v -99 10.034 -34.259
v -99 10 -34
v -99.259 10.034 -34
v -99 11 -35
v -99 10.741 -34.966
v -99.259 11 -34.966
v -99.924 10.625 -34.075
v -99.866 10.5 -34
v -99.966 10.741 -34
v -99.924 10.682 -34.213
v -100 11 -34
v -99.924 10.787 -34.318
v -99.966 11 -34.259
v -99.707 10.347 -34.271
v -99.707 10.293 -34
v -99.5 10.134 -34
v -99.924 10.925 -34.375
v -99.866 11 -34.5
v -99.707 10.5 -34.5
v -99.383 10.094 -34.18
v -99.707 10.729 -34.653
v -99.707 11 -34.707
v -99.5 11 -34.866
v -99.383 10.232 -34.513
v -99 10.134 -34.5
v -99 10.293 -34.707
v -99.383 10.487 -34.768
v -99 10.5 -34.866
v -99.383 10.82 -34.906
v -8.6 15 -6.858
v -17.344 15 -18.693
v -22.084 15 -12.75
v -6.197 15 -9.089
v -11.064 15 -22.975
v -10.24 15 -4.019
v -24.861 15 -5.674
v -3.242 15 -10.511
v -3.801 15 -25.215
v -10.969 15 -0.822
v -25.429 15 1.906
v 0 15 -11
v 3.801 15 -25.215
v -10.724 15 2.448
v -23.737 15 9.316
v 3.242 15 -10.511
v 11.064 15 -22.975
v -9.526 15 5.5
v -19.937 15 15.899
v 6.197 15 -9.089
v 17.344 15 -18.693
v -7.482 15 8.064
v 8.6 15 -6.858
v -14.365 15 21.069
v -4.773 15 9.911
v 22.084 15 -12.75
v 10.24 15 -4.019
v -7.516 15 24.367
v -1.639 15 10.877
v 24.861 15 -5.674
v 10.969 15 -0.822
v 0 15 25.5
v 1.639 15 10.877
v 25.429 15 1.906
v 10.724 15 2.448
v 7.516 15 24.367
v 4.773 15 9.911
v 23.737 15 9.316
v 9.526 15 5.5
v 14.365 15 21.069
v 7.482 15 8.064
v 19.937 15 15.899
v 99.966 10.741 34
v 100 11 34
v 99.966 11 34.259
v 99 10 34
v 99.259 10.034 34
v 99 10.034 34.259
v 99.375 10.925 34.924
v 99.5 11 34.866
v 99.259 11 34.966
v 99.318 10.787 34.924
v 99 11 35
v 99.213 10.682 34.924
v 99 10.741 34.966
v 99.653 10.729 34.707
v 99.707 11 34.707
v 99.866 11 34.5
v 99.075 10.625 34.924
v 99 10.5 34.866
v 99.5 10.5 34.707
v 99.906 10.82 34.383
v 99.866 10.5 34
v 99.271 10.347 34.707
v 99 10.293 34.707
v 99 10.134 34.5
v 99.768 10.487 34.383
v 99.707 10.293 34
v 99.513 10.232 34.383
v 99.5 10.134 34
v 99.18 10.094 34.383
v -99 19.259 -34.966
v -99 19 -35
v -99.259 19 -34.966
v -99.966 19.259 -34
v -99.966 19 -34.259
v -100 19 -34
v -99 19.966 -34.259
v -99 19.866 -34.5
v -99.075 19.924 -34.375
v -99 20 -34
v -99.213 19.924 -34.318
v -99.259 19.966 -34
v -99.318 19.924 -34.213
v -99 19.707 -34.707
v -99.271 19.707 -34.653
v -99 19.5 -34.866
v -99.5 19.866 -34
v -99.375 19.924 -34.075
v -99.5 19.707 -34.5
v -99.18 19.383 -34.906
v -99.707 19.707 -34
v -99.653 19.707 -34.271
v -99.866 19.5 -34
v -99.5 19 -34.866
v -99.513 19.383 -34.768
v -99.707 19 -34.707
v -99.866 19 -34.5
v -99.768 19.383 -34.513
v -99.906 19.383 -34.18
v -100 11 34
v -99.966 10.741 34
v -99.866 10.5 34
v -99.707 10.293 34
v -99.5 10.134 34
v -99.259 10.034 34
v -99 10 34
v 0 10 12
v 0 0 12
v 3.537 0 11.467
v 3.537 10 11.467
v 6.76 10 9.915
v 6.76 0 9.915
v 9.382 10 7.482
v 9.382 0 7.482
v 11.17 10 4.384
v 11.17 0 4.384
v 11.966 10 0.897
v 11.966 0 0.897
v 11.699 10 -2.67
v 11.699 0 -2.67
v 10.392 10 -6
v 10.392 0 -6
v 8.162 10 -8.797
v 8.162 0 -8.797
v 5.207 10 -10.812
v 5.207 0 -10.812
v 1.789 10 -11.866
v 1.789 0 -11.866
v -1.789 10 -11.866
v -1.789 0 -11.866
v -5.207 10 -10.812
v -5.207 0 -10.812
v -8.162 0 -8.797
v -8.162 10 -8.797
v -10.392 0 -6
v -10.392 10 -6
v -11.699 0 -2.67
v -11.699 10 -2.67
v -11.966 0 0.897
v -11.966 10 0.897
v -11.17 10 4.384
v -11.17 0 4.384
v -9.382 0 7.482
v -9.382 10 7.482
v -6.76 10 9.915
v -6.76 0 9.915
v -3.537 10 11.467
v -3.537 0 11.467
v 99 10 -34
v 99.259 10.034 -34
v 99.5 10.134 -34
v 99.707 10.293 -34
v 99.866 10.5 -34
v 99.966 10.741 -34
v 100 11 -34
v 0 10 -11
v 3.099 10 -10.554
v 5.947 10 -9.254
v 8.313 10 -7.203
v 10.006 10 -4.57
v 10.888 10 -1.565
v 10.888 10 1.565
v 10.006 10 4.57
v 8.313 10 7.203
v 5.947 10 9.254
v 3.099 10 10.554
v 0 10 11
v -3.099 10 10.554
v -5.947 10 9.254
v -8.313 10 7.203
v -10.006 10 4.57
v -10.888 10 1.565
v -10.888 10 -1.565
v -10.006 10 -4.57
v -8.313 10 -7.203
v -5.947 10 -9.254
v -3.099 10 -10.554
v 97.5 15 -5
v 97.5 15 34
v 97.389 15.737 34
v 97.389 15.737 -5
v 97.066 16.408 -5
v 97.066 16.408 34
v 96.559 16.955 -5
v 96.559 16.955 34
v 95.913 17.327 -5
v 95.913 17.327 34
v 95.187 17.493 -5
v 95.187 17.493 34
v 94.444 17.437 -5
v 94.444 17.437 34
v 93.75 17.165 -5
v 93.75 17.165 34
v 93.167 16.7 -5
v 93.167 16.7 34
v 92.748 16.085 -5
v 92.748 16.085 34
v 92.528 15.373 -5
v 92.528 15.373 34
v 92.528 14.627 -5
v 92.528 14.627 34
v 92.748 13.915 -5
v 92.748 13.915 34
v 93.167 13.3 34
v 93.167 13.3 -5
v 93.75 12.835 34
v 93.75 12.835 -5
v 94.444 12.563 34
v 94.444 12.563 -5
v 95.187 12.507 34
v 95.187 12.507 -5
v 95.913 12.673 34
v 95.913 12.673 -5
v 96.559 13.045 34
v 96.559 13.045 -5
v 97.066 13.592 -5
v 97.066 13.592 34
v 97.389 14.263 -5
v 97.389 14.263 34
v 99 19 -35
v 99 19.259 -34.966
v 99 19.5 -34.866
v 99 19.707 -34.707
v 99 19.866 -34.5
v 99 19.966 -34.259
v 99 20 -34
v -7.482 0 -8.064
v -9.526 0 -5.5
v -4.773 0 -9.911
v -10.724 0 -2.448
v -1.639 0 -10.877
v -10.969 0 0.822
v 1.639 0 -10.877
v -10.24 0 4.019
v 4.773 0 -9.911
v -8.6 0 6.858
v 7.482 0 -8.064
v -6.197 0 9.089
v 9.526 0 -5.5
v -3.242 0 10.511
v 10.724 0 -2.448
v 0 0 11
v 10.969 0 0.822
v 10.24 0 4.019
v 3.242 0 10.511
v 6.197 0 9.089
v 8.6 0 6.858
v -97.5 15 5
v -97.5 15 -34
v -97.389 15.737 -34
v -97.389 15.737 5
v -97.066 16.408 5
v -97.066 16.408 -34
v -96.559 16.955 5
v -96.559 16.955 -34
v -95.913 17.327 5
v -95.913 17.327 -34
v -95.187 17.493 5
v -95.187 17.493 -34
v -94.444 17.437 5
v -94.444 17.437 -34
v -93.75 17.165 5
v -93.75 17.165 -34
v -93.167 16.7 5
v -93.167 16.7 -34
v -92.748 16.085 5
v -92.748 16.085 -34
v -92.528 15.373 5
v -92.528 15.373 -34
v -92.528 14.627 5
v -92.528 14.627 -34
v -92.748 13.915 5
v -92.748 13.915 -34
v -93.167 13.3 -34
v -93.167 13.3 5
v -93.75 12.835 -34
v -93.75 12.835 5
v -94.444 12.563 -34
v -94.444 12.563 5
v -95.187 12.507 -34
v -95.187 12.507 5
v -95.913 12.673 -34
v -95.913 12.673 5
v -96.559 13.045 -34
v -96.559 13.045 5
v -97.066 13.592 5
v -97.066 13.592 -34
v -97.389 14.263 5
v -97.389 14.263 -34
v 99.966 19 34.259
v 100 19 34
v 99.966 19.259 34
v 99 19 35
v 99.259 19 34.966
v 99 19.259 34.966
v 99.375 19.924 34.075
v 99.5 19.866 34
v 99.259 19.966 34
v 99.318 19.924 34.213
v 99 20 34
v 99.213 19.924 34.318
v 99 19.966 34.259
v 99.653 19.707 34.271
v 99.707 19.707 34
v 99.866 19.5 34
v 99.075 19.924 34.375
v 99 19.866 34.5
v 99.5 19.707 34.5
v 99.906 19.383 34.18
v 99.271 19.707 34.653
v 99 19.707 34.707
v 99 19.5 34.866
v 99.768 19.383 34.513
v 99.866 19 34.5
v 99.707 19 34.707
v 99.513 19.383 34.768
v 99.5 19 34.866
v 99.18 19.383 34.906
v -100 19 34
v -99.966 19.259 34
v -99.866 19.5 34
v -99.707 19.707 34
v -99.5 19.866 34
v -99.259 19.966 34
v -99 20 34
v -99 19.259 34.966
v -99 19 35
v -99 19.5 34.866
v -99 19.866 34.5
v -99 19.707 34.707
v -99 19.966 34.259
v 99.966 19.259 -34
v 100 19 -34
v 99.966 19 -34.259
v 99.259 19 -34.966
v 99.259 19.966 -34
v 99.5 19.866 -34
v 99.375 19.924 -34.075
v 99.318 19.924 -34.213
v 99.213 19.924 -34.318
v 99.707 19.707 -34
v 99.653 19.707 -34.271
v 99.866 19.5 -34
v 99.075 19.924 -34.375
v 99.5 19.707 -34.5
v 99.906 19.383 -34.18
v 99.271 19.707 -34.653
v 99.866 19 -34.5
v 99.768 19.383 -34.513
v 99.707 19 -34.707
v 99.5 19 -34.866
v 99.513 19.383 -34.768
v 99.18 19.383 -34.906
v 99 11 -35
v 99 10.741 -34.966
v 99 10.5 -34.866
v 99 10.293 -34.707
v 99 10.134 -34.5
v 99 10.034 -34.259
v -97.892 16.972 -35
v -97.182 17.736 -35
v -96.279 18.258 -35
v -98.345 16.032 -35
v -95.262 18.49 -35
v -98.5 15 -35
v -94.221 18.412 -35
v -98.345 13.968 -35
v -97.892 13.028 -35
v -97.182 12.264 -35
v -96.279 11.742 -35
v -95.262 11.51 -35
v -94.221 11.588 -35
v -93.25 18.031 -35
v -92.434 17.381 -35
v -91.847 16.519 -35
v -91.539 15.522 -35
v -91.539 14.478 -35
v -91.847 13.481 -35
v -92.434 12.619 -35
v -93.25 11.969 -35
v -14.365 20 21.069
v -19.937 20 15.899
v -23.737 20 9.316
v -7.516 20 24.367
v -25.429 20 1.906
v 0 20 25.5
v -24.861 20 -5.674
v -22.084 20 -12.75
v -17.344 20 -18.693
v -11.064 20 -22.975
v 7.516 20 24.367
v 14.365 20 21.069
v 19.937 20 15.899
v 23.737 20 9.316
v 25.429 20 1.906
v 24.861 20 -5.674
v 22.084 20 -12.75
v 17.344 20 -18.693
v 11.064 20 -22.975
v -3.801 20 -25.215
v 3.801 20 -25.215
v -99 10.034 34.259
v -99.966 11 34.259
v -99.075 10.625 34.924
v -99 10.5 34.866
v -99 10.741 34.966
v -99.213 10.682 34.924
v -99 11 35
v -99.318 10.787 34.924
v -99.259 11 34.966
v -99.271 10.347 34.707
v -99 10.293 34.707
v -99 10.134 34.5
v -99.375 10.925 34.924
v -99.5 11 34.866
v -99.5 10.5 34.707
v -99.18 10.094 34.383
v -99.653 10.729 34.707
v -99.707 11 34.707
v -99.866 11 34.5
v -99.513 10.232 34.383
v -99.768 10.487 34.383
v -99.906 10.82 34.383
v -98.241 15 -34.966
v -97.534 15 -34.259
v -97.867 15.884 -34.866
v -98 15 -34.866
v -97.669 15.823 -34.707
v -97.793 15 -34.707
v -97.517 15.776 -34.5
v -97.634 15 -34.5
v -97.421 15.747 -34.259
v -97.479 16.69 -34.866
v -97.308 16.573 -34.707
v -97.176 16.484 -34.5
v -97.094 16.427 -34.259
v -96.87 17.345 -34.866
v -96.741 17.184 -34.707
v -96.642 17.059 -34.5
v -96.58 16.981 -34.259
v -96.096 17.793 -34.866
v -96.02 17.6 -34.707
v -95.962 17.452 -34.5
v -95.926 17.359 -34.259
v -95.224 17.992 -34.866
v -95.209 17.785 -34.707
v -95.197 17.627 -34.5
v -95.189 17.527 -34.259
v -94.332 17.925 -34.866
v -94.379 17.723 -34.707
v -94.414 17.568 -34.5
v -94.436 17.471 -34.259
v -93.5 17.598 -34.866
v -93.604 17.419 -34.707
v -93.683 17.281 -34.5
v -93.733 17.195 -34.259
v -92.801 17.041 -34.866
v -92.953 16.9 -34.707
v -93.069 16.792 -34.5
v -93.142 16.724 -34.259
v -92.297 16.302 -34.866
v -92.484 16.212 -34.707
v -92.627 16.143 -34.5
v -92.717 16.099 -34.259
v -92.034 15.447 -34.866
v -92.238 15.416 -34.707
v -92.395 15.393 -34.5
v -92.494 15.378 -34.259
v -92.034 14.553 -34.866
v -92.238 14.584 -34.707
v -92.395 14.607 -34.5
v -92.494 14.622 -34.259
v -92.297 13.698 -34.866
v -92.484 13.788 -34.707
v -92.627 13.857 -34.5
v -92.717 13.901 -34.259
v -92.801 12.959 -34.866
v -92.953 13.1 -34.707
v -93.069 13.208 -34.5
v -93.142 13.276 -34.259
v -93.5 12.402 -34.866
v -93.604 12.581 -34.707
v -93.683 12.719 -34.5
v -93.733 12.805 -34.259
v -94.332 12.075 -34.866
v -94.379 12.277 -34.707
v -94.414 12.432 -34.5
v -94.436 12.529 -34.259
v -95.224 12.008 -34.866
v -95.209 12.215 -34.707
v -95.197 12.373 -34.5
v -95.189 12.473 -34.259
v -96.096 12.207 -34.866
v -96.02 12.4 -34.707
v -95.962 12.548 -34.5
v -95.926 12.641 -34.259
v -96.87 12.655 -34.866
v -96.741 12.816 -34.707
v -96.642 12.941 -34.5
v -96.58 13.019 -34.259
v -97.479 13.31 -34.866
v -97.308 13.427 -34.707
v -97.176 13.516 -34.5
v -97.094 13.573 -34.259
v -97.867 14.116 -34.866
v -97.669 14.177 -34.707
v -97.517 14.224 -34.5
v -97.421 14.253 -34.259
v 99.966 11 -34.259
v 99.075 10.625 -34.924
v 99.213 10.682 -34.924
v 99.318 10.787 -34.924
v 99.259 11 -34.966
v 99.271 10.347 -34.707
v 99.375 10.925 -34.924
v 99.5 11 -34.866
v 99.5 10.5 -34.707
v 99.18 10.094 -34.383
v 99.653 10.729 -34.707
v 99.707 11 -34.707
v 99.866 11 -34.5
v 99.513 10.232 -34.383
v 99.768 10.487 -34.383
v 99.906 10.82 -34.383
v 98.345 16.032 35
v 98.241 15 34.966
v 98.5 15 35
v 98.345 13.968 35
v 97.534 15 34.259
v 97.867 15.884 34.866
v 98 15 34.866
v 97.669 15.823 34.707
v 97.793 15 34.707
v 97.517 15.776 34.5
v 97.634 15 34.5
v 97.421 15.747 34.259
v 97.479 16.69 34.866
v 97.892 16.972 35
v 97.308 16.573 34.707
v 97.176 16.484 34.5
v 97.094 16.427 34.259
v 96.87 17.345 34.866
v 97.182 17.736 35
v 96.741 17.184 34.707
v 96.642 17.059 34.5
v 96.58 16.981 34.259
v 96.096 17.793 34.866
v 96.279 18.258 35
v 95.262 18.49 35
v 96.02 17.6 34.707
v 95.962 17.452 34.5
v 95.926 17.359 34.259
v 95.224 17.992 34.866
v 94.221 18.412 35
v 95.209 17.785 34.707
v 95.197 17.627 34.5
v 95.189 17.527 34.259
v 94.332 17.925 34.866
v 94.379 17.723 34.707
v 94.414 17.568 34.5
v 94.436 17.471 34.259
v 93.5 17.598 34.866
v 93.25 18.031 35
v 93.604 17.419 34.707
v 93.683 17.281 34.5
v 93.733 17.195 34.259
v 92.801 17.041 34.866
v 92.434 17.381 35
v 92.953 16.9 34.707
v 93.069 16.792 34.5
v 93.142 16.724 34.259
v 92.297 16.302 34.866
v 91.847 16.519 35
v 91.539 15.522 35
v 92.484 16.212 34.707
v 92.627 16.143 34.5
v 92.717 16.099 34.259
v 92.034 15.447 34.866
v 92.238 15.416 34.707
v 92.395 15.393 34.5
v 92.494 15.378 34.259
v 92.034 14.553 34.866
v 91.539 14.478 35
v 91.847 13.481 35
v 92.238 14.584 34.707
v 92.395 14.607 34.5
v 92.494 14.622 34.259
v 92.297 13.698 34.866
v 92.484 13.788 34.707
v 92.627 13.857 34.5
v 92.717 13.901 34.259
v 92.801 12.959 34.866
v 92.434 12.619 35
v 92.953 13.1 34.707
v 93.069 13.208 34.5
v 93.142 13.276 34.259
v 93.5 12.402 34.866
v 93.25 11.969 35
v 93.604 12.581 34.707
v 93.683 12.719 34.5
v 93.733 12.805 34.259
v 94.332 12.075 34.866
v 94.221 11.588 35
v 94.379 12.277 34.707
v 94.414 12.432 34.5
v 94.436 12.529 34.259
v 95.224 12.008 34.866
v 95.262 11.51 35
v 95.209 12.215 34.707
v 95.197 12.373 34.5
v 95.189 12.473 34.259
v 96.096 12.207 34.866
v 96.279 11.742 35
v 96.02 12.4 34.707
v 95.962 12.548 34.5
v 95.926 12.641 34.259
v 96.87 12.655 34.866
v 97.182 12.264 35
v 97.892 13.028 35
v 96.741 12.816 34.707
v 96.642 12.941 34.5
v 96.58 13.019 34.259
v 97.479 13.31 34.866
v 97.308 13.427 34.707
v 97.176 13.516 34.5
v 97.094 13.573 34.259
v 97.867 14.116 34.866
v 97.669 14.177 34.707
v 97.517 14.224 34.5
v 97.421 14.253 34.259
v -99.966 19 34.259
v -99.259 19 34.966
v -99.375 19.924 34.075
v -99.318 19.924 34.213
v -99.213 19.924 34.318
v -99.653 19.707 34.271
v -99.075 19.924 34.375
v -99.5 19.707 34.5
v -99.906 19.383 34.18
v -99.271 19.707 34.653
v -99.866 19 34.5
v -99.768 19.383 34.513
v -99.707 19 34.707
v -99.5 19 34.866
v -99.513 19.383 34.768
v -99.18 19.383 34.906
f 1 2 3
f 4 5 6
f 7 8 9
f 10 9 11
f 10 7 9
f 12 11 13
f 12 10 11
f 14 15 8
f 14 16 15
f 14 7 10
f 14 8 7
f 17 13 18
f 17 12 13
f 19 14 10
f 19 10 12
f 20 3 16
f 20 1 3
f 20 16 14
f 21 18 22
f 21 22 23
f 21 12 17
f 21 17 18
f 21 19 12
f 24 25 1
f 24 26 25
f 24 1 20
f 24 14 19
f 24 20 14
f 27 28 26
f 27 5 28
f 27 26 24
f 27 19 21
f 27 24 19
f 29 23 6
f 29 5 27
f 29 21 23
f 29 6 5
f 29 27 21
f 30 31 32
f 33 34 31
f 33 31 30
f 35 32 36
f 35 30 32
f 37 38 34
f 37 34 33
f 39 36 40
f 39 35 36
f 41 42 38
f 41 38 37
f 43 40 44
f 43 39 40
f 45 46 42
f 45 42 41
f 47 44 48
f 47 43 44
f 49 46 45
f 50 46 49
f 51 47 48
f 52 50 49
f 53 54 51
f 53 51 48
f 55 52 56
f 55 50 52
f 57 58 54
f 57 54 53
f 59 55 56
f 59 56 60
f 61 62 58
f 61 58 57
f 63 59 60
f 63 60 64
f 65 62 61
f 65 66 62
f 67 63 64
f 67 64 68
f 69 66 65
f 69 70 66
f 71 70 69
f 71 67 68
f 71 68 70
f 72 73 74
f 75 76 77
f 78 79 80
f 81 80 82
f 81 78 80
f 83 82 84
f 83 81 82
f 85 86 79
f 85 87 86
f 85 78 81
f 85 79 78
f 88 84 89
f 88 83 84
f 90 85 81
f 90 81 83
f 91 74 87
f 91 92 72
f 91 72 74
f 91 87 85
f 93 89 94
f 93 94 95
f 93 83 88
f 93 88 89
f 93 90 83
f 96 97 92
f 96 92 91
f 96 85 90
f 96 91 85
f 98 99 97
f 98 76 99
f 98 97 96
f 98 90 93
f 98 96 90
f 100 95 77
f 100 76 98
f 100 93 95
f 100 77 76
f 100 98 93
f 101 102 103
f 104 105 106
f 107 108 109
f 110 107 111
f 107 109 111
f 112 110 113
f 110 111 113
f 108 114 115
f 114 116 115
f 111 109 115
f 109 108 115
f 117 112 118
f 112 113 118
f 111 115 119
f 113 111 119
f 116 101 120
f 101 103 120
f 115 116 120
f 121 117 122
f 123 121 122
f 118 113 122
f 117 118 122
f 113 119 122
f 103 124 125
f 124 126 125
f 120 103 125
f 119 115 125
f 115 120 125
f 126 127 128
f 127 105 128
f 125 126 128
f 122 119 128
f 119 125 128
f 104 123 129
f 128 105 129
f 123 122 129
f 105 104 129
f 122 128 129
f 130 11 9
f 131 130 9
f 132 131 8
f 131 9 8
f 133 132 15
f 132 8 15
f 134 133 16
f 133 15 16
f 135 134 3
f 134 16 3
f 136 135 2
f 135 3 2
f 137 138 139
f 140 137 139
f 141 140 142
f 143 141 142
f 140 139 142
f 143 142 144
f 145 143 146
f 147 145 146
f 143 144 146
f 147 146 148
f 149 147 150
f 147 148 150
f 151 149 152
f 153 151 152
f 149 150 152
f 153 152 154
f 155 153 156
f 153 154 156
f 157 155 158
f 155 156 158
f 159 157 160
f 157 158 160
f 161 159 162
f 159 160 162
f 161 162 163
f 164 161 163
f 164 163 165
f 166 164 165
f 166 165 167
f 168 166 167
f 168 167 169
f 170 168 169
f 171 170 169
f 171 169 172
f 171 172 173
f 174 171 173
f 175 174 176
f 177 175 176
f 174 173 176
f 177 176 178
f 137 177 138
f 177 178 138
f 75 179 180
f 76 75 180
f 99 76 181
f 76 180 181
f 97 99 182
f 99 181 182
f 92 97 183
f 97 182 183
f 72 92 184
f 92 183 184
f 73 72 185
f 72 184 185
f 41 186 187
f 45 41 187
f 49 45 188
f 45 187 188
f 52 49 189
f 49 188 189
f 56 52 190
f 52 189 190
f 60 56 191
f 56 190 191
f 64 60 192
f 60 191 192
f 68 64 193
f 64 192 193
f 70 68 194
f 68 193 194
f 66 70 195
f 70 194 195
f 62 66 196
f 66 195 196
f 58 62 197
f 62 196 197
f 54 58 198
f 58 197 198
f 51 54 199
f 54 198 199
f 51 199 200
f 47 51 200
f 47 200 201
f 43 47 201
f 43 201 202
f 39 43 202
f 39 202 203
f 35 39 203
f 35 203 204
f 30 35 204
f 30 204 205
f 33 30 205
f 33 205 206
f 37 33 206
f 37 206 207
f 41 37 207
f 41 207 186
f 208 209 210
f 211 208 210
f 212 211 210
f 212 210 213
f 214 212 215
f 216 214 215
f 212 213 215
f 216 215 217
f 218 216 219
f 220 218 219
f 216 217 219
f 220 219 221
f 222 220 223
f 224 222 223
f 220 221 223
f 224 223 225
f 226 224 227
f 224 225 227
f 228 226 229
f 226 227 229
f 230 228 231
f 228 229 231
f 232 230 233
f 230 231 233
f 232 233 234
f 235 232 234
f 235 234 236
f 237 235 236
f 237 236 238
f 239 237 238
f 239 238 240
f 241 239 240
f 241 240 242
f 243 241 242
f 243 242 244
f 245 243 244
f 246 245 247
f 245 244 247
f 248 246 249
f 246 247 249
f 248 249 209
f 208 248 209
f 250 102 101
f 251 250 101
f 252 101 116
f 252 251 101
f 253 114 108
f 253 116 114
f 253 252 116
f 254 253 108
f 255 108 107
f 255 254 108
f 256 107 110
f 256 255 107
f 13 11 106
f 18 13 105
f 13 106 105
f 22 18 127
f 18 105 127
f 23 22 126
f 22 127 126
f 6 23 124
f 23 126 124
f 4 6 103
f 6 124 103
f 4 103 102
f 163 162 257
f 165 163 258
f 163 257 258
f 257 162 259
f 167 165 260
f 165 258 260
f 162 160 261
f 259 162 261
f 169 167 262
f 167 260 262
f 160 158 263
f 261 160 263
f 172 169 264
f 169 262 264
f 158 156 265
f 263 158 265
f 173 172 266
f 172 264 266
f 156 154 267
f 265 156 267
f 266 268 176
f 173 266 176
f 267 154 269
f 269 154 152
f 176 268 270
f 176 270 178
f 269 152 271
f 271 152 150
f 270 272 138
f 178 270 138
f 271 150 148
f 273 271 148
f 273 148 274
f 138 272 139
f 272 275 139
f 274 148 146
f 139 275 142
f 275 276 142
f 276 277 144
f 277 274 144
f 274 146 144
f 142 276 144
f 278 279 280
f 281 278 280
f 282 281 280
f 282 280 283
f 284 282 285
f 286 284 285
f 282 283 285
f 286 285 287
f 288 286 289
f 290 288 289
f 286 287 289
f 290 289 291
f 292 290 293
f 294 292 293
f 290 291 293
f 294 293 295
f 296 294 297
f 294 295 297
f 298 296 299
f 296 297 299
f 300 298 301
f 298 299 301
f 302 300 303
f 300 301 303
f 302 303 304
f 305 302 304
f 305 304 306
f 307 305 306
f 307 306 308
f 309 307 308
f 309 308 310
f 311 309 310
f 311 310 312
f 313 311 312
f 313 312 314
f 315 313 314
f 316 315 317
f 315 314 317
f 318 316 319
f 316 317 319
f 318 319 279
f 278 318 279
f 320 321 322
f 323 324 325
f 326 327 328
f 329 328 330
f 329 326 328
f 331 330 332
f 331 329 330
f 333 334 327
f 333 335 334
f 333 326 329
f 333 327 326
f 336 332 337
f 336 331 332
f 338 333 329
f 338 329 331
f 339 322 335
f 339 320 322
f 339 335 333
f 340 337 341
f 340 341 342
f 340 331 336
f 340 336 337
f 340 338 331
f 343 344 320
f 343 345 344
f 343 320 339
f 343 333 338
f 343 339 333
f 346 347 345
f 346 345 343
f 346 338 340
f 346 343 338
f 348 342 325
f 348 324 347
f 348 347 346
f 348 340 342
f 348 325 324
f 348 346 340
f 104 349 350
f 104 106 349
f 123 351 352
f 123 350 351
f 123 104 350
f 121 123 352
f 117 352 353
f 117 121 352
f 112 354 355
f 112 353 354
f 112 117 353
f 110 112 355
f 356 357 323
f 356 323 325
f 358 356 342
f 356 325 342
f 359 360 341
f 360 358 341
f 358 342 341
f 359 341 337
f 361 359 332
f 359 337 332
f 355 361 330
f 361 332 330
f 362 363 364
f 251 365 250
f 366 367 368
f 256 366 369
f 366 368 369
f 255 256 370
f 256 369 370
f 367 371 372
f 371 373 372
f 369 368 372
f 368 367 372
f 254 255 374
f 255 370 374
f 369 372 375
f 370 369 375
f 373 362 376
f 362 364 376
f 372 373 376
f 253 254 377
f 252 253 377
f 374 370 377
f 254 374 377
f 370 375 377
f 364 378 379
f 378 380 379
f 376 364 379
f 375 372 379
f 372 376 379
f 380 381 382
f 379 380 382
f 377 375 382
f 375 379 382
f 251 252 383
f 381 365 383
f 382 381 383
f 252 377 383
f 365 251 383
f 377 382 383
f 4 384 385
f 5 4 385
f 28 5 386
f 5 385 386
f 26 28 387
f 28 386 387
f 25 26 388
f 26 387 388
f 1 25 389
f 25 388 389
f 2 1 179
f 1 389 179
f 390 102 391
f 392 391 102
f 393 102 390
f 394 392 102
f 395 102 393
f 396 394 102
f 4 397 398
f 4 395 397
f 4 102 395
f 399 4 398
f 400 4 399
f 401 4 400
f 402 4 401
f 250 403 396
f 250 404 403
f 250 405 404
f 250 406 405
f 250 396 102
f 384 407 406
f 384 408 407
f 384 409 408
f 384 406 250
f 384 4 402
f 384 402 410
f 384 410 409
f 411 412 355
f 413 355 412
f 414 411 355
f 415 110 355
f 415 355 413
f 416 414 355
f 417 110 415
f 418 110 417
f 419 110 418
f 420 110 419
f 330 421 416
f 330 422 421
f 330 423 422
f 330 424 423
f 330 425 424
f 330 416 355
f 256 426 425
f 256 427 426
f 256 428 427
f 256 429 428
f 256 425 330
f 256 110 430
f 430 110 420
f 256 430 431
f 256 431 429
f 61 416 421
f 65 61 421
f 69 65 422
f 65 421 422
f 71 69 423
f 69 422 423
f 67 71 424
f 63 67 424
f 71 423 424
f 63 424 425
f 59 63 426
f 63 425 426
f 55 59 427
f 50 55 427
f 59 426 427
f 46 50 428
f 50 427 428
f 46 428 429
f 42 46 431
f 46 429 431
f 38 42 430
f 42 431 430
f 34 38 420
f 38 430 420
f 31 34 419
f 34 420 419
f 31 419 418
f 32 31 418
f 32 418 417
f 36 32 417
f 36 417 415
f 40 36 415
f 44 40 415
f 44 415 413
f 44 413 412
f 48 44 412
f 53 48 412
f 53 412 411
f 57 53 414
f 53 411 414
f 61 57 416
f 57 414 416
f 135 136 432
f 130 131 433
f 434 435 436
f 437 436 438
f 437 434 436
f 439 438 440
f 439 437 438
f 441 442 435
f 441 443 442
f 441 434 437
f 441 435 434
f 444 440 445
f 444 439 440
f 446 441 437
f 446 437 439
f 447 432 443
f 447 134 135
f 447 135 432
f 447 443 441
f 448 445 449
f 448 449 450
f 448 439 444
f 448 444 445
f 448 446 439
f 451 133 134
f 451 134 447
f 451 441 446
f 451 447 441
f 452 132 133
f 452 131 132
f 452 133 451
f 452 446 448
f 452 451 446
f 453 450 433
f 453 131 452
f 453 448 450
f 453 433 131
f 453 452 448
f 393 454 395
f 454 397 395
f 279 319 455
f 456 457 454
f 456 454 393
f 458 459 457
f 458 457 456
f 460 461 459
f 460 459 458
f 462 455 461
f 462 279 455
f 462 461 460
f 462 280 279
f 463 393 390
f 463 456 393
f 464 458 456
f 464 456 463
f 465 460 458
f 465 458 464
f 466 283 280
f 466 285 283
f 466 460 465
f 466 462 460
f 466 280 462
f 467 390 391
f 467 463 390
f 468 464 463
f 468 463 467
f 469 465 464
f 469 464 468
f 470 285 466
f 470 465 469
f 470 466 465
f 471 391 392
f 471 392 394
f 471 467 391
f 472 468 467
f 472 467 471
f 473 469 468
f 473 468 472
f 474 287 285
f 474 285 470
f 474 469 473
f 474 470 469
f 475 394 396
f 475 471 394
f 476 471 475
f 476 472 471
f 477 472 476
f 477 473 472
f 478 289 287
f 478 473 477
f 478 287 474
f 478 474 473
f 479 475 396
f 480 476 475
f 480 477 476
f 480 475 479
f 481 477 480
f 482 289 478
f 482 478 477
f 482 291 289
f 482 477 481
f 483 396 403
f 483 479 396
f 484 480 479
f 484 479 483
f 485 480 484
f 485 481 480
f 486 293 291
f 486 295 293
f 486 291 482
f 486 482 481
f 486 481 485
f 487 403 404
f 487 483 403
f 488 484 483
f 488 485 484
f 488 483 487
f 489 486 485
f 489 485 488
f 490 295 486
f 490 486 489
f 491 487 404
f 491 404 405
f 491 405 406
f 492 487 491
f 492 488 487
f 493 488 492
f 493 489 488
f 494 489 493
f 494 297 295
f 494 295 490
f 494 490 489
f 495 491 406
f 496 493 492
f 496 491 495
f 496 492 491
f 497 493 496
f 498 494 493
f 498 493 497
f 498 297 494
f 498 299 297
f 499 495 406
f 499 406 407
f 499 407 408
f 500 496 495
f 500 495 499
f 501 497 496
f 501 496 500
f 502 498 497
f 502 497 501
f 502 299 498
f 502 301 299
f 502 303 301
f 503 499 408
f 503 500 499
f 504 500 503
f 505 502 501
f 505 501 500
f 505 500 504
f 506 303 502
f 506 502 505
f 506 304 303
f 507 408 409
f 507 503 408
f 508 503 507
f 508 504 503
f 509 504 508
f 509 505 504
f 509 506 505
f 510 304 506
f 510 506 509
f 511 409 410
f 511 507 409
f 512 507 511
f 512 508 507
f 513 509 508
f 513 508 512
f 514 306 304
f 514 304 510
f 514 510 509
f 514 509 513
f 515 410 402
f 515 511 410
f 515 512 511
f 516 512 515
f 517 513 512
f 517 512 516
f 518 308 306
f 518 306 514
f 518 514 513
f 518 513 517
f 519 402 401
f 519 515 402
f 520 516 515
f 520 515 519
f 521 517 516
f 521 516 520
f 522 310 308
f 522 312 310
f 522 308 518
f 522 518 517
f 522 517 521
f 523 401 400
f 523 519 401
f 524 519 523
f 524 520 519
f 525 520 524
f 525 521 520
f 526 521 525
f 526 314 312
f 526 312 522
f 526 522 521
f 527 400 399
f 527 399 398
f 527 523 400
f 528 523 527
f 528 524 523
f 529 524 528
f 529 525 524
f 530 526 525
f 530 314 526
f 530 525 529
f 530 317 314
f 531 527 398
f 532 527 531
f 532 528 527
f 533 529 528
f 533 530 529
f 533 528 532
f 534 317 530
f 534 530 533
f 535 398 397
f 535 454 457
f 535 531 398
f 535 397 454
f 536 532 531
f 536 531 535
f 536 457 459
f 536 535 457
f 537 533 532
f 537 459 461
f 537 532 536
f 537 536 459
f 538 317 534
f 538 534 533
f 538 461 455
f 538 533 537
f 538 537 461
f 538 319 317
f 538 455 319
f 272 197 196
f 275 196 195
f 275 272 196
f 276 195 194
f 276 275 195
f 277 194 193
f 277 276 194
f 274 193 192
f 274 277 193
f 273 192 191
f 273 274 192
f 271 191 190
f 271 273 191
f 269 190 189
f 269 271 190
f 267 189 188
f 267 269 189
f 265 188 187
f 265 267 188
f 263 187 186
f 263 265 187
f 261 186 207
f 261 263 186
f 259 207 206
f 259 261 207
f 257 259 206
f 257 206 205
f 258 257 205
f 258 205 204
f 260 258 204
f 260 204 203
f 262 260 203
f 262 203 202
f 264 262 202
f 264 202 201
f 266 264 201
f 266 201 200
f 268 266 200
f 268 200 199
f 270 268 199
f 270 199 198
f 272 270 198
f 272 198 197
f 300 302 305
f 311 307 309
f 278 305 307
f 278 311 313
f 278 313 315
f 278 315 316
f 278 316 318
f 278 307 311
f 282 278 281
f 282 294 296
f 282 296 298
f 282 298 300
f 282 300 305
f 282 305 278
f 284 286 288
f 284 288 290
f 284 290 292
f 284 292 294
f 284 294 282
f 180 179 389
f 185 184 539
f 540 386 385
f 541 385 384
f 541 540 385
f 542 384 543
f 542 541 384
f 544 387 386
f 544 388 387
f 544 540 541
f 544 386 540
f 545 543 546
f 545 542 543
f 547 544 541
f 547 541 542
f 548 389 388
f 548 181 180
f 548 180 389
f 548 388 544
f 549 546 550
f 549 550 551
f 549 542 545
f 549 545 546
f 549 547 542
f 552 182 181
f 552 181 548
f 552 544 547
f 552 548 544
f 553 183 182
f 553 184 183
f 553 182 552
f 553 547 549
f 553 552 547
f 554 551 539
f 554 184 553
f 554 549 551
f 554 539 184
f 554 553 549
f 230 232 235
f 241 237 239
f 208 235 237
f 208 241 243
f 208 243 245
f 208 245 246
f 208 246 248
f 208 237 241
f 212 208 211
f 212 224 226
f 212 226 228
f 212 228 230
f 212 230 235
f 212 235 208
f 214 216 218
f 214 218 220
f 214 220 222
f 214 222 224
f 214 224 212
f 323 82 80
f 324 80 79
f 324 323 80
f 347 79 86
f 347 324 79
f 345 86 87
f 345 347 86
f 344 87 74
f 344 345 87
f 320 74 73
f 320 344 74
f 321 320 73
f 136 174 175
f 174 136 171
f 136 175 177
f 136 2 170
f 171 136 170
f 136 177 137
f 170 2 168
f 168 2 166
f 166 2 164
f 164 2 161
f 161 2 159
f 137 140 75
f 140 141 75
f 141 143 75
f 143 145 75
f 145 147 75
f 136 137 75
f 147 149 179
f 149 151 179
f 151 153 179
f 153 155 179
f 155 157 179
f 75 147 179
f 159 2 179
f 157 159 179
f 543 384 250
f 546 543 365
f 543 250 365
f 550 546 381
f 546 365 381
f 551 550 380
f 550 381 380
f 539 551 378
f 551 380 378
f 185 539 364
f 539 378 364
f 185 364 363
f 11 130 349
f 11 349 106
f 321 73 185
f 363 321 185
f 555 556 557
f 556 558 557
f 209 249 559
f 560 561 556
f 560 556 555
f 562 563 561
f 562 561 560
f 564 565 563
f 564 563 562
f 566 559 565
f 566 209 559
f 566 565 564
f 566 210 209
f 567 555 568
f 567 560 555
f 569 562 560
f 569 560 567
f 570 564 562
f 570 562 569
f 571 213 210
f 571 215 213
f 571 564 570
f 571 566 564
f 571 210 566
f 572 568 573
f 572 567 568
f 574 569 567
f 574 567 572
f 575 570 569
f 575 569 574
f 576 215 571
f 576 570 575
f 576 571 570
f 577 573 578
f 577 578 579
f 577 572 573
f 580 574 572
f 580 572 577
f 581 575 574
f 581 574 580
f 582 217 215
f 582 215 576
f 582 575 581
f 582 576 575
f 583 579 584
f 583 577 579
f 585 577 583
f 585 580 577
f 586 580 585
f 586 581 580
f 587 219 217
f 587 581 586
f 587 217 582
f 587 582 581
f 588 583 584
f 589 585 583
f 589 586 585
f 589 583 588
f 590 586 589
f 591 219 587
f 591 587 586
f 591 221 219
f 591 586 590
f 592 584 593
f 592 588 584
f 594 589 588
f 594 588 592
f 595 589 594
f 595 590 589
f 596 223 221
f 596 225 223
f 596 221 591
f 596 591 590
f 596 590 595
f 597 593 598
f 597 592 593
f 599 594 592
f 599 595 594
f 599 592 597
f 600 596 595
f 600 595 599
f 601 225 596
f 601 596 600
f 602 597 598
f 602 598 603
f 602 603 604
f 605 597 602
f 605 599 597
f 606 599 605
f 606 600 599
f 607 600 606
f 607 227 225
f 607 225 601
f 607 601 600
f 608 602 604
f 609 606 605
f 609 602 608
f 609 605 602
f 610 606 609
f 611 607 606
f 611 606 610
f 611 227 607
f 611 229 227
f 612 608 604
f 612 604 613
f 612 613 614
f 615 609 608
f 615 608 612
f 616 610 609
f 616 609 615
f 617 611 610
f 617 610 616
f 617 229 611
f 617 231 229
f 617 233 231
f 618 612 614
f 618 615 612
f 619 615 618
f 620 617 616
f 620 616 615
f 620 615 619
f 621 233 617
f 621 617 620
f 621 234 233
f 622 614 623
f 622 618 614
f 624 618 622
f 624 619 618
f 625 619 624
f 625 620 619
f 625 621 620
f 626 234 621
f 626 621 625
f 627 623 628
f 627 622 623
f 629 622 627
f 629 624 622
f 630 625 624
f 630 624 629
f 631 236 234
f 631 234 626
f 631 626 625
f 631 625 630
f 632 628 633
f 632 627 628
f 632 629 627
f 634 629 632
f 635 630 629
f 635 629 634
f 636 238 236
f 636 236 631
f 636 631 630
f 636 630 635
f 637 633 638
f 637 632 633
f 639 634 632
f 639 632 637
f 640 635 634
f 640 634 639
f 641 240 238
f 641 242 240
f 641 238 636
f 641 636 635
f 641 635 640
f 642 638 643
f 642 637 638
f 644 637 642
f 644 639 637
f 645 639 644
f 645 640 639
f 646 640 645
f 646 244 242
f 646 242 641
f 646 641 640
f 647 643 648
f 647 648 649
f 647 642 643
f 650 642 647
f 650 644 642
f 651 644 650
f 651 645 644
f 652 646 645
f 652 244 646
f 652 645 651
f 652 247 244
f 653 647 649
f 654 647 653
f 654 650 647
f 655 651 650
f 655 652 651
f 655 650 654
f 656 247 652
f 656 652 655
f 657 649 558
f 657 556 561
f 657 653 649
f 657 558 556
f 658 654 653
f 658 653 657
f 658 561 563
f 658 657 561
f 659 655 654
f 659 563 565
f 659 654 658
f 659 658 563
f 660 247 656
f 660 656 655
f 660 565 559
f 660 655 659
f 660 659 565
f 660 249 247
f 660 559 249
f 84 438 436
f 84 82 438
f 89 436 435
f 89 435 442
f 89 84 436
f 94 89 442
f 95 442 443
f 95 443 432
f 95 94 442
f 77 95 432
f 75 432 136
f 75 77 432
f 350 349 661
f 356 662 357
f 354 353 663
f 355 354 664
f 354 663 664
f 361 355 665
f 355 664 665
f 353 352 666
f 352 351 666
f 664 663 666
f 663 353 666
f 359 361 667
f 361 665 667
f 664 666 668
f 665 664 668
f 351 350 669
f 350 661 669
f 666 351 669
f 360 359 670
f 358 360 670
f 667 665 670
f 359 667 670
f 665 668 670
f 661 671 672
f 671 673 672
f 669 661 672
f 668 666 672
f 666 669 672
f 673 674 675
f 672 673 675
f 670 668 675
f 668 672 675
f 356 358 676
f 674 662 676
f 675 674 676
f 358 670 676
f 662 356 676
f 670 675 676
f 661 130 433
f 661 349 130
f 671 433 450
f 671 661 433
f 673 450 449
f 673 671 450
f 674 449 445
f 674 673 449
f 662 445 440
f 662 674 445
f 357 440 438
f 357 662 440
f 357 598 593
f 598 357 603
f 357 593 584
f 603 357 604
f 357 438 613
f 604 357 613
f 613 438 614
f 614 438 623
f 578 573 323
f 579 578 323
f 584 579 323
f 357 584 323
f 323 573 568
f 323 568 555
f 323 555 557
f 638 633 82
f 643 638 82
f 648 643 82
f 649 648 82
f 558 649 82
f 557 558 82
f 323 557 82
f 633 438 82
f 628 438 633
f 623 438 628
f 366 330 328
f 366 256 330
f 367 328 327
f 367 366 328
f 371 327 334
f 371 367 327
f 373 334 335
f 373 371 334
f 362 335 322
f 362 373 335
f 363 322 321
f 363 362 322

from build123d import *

# Parameters (mm, degrees)
SKETCH1_R           = 12
SKETCH1_R_2         = 11
BOSS_EXTRUDE1_DEPTH = 10
SKETCH2_W           = 200
SKETCH2_H           = 70
BOSS_EXTRUDE2_DEPTH = 10
CUT_EXTRUDE1_REACH  = 12
SKETCH3_R           = 11
SKETCH4_R           = 25.5
CUT_EXTRUDE2_DEPTH  = 5
SKETCH5_R           = 2.5
CUT_EXTRUDE3_DEPTH  = 40
SKETCH6_R           = 2.5
CUT_EXTRUDE4_DEPTH  = 40
FILLET1_R           = 1


with BuildPart() as part:
    # Sketch1 → Boss-Extrude1 (new body)
    with BuildSketch(Plane(origin=(0, 0, 0), x_dir=(1, 0, 0), z_dir=(0, 1, 0))):
        with Locations(Location((0, 0, 0), (0, 0, 270))):  # turned: the seam where the file's is
            Circle(SKETCH1_R)
        with Locations(Location((0, 0, 0), (0, 0, 270))):  # turned: the seam where the file's is
            Circle(SKETCH1_R_2, mode=Mode.SUBTRACT)
    extrude(amount=BOSS_EXTRUDE1_DEPTH)

    # Sketch2 → Boss-Extrude2 (add)
    with BuildSketch(Plane(origin=(0, 10, 0), x_dir=(1, 0, 0), z_dir=(0, 1, 0))):
        Rectangle(SKETCH2_W, SKETCH2_H)
    extrude(amount=BOSS_EXTRUDE2_DEPTH)

    # Sketch3 → Cut-Extrude1 (cut, up to next)
    with BuildSketch(Plane.XZ.offset(-10), mode=Mode.PRIVATE) as cut_extrude1_sk1:
        with Locations(Location((0, 0, 0), (0, 0, 270))):  # turned: the seam where the file's is
            Circle(SKETCH3_R)
    cut_extrude1_tool1 = extrude(cut_extrude1_sk1.sketch, amount=-CUT_EXTRUDE1_REACH, mode=Mode.PRIVATE) & part.part
    add(cut_extrude1_tool1.solids().sort_by_distance((0, 10, 0))[0], mode=Mode.SUBTRACT)

    # Sketch4 → Cut-Extrude2 (cut)
    with BuildSketch(Plane(origin=(0, 20, 0), x_dir=(1, 0, 0), z_dir=(0, 1, 0))):
        with Locations(Location((0, 0, 0), (0, 0, 270))):  # turned: the seam where the file's is
            Circle(SKETCH4_R)
    extrude(amount=-CUT_EXTRUDE2_DEPTH, mode=Mode.SUBTRACT)

    # Sketch5 → Cut-Extrude3 (cut)
    with BuildSketch(Plane.XY.offset(35)):
        with Locations((95, 15)):
            Circle(SKETCH5_R)
    extrude(amount=-CUT_EXTRUDE3_DEPTH, mode=Mode.SUBTRACT)

    # Sketch6 → Cut-Extrude4 (cut)
    with BuildSketch(Plane(origin=(0, 0, -35), x_dir=(-1, 0, 0), z_dir=(0, 0, -1))):
        with Locations((95, 15)):
            Circle(SKETCH6_R)
    extrude(amount=-CUT_EXTRUDE4_DEPTH, mode=Mode.SUBTRACT)

    # Fillet1
    fillet1_edges = [part.edges().sort_by_distance(p)[0] for p in [
        (100, 10, 0),
        (100, 15, 35),
        (0, 10, -35),
        (100, 15, -35),
        (-100, 10, 0),
        (-100, 15, -35),
        (0, 10, 35),
        (-100, 15, 35),
        (100, 20, 0),
        (0, 20, -35),
        (-100, 20, 0),
        (0, 20, 35),
        (92.5, 15, 35),
        (-92.5, 15, -35),
    ]]
    fillet(fillet1_edges, radius=FILLET1_R)


solid = part.part
